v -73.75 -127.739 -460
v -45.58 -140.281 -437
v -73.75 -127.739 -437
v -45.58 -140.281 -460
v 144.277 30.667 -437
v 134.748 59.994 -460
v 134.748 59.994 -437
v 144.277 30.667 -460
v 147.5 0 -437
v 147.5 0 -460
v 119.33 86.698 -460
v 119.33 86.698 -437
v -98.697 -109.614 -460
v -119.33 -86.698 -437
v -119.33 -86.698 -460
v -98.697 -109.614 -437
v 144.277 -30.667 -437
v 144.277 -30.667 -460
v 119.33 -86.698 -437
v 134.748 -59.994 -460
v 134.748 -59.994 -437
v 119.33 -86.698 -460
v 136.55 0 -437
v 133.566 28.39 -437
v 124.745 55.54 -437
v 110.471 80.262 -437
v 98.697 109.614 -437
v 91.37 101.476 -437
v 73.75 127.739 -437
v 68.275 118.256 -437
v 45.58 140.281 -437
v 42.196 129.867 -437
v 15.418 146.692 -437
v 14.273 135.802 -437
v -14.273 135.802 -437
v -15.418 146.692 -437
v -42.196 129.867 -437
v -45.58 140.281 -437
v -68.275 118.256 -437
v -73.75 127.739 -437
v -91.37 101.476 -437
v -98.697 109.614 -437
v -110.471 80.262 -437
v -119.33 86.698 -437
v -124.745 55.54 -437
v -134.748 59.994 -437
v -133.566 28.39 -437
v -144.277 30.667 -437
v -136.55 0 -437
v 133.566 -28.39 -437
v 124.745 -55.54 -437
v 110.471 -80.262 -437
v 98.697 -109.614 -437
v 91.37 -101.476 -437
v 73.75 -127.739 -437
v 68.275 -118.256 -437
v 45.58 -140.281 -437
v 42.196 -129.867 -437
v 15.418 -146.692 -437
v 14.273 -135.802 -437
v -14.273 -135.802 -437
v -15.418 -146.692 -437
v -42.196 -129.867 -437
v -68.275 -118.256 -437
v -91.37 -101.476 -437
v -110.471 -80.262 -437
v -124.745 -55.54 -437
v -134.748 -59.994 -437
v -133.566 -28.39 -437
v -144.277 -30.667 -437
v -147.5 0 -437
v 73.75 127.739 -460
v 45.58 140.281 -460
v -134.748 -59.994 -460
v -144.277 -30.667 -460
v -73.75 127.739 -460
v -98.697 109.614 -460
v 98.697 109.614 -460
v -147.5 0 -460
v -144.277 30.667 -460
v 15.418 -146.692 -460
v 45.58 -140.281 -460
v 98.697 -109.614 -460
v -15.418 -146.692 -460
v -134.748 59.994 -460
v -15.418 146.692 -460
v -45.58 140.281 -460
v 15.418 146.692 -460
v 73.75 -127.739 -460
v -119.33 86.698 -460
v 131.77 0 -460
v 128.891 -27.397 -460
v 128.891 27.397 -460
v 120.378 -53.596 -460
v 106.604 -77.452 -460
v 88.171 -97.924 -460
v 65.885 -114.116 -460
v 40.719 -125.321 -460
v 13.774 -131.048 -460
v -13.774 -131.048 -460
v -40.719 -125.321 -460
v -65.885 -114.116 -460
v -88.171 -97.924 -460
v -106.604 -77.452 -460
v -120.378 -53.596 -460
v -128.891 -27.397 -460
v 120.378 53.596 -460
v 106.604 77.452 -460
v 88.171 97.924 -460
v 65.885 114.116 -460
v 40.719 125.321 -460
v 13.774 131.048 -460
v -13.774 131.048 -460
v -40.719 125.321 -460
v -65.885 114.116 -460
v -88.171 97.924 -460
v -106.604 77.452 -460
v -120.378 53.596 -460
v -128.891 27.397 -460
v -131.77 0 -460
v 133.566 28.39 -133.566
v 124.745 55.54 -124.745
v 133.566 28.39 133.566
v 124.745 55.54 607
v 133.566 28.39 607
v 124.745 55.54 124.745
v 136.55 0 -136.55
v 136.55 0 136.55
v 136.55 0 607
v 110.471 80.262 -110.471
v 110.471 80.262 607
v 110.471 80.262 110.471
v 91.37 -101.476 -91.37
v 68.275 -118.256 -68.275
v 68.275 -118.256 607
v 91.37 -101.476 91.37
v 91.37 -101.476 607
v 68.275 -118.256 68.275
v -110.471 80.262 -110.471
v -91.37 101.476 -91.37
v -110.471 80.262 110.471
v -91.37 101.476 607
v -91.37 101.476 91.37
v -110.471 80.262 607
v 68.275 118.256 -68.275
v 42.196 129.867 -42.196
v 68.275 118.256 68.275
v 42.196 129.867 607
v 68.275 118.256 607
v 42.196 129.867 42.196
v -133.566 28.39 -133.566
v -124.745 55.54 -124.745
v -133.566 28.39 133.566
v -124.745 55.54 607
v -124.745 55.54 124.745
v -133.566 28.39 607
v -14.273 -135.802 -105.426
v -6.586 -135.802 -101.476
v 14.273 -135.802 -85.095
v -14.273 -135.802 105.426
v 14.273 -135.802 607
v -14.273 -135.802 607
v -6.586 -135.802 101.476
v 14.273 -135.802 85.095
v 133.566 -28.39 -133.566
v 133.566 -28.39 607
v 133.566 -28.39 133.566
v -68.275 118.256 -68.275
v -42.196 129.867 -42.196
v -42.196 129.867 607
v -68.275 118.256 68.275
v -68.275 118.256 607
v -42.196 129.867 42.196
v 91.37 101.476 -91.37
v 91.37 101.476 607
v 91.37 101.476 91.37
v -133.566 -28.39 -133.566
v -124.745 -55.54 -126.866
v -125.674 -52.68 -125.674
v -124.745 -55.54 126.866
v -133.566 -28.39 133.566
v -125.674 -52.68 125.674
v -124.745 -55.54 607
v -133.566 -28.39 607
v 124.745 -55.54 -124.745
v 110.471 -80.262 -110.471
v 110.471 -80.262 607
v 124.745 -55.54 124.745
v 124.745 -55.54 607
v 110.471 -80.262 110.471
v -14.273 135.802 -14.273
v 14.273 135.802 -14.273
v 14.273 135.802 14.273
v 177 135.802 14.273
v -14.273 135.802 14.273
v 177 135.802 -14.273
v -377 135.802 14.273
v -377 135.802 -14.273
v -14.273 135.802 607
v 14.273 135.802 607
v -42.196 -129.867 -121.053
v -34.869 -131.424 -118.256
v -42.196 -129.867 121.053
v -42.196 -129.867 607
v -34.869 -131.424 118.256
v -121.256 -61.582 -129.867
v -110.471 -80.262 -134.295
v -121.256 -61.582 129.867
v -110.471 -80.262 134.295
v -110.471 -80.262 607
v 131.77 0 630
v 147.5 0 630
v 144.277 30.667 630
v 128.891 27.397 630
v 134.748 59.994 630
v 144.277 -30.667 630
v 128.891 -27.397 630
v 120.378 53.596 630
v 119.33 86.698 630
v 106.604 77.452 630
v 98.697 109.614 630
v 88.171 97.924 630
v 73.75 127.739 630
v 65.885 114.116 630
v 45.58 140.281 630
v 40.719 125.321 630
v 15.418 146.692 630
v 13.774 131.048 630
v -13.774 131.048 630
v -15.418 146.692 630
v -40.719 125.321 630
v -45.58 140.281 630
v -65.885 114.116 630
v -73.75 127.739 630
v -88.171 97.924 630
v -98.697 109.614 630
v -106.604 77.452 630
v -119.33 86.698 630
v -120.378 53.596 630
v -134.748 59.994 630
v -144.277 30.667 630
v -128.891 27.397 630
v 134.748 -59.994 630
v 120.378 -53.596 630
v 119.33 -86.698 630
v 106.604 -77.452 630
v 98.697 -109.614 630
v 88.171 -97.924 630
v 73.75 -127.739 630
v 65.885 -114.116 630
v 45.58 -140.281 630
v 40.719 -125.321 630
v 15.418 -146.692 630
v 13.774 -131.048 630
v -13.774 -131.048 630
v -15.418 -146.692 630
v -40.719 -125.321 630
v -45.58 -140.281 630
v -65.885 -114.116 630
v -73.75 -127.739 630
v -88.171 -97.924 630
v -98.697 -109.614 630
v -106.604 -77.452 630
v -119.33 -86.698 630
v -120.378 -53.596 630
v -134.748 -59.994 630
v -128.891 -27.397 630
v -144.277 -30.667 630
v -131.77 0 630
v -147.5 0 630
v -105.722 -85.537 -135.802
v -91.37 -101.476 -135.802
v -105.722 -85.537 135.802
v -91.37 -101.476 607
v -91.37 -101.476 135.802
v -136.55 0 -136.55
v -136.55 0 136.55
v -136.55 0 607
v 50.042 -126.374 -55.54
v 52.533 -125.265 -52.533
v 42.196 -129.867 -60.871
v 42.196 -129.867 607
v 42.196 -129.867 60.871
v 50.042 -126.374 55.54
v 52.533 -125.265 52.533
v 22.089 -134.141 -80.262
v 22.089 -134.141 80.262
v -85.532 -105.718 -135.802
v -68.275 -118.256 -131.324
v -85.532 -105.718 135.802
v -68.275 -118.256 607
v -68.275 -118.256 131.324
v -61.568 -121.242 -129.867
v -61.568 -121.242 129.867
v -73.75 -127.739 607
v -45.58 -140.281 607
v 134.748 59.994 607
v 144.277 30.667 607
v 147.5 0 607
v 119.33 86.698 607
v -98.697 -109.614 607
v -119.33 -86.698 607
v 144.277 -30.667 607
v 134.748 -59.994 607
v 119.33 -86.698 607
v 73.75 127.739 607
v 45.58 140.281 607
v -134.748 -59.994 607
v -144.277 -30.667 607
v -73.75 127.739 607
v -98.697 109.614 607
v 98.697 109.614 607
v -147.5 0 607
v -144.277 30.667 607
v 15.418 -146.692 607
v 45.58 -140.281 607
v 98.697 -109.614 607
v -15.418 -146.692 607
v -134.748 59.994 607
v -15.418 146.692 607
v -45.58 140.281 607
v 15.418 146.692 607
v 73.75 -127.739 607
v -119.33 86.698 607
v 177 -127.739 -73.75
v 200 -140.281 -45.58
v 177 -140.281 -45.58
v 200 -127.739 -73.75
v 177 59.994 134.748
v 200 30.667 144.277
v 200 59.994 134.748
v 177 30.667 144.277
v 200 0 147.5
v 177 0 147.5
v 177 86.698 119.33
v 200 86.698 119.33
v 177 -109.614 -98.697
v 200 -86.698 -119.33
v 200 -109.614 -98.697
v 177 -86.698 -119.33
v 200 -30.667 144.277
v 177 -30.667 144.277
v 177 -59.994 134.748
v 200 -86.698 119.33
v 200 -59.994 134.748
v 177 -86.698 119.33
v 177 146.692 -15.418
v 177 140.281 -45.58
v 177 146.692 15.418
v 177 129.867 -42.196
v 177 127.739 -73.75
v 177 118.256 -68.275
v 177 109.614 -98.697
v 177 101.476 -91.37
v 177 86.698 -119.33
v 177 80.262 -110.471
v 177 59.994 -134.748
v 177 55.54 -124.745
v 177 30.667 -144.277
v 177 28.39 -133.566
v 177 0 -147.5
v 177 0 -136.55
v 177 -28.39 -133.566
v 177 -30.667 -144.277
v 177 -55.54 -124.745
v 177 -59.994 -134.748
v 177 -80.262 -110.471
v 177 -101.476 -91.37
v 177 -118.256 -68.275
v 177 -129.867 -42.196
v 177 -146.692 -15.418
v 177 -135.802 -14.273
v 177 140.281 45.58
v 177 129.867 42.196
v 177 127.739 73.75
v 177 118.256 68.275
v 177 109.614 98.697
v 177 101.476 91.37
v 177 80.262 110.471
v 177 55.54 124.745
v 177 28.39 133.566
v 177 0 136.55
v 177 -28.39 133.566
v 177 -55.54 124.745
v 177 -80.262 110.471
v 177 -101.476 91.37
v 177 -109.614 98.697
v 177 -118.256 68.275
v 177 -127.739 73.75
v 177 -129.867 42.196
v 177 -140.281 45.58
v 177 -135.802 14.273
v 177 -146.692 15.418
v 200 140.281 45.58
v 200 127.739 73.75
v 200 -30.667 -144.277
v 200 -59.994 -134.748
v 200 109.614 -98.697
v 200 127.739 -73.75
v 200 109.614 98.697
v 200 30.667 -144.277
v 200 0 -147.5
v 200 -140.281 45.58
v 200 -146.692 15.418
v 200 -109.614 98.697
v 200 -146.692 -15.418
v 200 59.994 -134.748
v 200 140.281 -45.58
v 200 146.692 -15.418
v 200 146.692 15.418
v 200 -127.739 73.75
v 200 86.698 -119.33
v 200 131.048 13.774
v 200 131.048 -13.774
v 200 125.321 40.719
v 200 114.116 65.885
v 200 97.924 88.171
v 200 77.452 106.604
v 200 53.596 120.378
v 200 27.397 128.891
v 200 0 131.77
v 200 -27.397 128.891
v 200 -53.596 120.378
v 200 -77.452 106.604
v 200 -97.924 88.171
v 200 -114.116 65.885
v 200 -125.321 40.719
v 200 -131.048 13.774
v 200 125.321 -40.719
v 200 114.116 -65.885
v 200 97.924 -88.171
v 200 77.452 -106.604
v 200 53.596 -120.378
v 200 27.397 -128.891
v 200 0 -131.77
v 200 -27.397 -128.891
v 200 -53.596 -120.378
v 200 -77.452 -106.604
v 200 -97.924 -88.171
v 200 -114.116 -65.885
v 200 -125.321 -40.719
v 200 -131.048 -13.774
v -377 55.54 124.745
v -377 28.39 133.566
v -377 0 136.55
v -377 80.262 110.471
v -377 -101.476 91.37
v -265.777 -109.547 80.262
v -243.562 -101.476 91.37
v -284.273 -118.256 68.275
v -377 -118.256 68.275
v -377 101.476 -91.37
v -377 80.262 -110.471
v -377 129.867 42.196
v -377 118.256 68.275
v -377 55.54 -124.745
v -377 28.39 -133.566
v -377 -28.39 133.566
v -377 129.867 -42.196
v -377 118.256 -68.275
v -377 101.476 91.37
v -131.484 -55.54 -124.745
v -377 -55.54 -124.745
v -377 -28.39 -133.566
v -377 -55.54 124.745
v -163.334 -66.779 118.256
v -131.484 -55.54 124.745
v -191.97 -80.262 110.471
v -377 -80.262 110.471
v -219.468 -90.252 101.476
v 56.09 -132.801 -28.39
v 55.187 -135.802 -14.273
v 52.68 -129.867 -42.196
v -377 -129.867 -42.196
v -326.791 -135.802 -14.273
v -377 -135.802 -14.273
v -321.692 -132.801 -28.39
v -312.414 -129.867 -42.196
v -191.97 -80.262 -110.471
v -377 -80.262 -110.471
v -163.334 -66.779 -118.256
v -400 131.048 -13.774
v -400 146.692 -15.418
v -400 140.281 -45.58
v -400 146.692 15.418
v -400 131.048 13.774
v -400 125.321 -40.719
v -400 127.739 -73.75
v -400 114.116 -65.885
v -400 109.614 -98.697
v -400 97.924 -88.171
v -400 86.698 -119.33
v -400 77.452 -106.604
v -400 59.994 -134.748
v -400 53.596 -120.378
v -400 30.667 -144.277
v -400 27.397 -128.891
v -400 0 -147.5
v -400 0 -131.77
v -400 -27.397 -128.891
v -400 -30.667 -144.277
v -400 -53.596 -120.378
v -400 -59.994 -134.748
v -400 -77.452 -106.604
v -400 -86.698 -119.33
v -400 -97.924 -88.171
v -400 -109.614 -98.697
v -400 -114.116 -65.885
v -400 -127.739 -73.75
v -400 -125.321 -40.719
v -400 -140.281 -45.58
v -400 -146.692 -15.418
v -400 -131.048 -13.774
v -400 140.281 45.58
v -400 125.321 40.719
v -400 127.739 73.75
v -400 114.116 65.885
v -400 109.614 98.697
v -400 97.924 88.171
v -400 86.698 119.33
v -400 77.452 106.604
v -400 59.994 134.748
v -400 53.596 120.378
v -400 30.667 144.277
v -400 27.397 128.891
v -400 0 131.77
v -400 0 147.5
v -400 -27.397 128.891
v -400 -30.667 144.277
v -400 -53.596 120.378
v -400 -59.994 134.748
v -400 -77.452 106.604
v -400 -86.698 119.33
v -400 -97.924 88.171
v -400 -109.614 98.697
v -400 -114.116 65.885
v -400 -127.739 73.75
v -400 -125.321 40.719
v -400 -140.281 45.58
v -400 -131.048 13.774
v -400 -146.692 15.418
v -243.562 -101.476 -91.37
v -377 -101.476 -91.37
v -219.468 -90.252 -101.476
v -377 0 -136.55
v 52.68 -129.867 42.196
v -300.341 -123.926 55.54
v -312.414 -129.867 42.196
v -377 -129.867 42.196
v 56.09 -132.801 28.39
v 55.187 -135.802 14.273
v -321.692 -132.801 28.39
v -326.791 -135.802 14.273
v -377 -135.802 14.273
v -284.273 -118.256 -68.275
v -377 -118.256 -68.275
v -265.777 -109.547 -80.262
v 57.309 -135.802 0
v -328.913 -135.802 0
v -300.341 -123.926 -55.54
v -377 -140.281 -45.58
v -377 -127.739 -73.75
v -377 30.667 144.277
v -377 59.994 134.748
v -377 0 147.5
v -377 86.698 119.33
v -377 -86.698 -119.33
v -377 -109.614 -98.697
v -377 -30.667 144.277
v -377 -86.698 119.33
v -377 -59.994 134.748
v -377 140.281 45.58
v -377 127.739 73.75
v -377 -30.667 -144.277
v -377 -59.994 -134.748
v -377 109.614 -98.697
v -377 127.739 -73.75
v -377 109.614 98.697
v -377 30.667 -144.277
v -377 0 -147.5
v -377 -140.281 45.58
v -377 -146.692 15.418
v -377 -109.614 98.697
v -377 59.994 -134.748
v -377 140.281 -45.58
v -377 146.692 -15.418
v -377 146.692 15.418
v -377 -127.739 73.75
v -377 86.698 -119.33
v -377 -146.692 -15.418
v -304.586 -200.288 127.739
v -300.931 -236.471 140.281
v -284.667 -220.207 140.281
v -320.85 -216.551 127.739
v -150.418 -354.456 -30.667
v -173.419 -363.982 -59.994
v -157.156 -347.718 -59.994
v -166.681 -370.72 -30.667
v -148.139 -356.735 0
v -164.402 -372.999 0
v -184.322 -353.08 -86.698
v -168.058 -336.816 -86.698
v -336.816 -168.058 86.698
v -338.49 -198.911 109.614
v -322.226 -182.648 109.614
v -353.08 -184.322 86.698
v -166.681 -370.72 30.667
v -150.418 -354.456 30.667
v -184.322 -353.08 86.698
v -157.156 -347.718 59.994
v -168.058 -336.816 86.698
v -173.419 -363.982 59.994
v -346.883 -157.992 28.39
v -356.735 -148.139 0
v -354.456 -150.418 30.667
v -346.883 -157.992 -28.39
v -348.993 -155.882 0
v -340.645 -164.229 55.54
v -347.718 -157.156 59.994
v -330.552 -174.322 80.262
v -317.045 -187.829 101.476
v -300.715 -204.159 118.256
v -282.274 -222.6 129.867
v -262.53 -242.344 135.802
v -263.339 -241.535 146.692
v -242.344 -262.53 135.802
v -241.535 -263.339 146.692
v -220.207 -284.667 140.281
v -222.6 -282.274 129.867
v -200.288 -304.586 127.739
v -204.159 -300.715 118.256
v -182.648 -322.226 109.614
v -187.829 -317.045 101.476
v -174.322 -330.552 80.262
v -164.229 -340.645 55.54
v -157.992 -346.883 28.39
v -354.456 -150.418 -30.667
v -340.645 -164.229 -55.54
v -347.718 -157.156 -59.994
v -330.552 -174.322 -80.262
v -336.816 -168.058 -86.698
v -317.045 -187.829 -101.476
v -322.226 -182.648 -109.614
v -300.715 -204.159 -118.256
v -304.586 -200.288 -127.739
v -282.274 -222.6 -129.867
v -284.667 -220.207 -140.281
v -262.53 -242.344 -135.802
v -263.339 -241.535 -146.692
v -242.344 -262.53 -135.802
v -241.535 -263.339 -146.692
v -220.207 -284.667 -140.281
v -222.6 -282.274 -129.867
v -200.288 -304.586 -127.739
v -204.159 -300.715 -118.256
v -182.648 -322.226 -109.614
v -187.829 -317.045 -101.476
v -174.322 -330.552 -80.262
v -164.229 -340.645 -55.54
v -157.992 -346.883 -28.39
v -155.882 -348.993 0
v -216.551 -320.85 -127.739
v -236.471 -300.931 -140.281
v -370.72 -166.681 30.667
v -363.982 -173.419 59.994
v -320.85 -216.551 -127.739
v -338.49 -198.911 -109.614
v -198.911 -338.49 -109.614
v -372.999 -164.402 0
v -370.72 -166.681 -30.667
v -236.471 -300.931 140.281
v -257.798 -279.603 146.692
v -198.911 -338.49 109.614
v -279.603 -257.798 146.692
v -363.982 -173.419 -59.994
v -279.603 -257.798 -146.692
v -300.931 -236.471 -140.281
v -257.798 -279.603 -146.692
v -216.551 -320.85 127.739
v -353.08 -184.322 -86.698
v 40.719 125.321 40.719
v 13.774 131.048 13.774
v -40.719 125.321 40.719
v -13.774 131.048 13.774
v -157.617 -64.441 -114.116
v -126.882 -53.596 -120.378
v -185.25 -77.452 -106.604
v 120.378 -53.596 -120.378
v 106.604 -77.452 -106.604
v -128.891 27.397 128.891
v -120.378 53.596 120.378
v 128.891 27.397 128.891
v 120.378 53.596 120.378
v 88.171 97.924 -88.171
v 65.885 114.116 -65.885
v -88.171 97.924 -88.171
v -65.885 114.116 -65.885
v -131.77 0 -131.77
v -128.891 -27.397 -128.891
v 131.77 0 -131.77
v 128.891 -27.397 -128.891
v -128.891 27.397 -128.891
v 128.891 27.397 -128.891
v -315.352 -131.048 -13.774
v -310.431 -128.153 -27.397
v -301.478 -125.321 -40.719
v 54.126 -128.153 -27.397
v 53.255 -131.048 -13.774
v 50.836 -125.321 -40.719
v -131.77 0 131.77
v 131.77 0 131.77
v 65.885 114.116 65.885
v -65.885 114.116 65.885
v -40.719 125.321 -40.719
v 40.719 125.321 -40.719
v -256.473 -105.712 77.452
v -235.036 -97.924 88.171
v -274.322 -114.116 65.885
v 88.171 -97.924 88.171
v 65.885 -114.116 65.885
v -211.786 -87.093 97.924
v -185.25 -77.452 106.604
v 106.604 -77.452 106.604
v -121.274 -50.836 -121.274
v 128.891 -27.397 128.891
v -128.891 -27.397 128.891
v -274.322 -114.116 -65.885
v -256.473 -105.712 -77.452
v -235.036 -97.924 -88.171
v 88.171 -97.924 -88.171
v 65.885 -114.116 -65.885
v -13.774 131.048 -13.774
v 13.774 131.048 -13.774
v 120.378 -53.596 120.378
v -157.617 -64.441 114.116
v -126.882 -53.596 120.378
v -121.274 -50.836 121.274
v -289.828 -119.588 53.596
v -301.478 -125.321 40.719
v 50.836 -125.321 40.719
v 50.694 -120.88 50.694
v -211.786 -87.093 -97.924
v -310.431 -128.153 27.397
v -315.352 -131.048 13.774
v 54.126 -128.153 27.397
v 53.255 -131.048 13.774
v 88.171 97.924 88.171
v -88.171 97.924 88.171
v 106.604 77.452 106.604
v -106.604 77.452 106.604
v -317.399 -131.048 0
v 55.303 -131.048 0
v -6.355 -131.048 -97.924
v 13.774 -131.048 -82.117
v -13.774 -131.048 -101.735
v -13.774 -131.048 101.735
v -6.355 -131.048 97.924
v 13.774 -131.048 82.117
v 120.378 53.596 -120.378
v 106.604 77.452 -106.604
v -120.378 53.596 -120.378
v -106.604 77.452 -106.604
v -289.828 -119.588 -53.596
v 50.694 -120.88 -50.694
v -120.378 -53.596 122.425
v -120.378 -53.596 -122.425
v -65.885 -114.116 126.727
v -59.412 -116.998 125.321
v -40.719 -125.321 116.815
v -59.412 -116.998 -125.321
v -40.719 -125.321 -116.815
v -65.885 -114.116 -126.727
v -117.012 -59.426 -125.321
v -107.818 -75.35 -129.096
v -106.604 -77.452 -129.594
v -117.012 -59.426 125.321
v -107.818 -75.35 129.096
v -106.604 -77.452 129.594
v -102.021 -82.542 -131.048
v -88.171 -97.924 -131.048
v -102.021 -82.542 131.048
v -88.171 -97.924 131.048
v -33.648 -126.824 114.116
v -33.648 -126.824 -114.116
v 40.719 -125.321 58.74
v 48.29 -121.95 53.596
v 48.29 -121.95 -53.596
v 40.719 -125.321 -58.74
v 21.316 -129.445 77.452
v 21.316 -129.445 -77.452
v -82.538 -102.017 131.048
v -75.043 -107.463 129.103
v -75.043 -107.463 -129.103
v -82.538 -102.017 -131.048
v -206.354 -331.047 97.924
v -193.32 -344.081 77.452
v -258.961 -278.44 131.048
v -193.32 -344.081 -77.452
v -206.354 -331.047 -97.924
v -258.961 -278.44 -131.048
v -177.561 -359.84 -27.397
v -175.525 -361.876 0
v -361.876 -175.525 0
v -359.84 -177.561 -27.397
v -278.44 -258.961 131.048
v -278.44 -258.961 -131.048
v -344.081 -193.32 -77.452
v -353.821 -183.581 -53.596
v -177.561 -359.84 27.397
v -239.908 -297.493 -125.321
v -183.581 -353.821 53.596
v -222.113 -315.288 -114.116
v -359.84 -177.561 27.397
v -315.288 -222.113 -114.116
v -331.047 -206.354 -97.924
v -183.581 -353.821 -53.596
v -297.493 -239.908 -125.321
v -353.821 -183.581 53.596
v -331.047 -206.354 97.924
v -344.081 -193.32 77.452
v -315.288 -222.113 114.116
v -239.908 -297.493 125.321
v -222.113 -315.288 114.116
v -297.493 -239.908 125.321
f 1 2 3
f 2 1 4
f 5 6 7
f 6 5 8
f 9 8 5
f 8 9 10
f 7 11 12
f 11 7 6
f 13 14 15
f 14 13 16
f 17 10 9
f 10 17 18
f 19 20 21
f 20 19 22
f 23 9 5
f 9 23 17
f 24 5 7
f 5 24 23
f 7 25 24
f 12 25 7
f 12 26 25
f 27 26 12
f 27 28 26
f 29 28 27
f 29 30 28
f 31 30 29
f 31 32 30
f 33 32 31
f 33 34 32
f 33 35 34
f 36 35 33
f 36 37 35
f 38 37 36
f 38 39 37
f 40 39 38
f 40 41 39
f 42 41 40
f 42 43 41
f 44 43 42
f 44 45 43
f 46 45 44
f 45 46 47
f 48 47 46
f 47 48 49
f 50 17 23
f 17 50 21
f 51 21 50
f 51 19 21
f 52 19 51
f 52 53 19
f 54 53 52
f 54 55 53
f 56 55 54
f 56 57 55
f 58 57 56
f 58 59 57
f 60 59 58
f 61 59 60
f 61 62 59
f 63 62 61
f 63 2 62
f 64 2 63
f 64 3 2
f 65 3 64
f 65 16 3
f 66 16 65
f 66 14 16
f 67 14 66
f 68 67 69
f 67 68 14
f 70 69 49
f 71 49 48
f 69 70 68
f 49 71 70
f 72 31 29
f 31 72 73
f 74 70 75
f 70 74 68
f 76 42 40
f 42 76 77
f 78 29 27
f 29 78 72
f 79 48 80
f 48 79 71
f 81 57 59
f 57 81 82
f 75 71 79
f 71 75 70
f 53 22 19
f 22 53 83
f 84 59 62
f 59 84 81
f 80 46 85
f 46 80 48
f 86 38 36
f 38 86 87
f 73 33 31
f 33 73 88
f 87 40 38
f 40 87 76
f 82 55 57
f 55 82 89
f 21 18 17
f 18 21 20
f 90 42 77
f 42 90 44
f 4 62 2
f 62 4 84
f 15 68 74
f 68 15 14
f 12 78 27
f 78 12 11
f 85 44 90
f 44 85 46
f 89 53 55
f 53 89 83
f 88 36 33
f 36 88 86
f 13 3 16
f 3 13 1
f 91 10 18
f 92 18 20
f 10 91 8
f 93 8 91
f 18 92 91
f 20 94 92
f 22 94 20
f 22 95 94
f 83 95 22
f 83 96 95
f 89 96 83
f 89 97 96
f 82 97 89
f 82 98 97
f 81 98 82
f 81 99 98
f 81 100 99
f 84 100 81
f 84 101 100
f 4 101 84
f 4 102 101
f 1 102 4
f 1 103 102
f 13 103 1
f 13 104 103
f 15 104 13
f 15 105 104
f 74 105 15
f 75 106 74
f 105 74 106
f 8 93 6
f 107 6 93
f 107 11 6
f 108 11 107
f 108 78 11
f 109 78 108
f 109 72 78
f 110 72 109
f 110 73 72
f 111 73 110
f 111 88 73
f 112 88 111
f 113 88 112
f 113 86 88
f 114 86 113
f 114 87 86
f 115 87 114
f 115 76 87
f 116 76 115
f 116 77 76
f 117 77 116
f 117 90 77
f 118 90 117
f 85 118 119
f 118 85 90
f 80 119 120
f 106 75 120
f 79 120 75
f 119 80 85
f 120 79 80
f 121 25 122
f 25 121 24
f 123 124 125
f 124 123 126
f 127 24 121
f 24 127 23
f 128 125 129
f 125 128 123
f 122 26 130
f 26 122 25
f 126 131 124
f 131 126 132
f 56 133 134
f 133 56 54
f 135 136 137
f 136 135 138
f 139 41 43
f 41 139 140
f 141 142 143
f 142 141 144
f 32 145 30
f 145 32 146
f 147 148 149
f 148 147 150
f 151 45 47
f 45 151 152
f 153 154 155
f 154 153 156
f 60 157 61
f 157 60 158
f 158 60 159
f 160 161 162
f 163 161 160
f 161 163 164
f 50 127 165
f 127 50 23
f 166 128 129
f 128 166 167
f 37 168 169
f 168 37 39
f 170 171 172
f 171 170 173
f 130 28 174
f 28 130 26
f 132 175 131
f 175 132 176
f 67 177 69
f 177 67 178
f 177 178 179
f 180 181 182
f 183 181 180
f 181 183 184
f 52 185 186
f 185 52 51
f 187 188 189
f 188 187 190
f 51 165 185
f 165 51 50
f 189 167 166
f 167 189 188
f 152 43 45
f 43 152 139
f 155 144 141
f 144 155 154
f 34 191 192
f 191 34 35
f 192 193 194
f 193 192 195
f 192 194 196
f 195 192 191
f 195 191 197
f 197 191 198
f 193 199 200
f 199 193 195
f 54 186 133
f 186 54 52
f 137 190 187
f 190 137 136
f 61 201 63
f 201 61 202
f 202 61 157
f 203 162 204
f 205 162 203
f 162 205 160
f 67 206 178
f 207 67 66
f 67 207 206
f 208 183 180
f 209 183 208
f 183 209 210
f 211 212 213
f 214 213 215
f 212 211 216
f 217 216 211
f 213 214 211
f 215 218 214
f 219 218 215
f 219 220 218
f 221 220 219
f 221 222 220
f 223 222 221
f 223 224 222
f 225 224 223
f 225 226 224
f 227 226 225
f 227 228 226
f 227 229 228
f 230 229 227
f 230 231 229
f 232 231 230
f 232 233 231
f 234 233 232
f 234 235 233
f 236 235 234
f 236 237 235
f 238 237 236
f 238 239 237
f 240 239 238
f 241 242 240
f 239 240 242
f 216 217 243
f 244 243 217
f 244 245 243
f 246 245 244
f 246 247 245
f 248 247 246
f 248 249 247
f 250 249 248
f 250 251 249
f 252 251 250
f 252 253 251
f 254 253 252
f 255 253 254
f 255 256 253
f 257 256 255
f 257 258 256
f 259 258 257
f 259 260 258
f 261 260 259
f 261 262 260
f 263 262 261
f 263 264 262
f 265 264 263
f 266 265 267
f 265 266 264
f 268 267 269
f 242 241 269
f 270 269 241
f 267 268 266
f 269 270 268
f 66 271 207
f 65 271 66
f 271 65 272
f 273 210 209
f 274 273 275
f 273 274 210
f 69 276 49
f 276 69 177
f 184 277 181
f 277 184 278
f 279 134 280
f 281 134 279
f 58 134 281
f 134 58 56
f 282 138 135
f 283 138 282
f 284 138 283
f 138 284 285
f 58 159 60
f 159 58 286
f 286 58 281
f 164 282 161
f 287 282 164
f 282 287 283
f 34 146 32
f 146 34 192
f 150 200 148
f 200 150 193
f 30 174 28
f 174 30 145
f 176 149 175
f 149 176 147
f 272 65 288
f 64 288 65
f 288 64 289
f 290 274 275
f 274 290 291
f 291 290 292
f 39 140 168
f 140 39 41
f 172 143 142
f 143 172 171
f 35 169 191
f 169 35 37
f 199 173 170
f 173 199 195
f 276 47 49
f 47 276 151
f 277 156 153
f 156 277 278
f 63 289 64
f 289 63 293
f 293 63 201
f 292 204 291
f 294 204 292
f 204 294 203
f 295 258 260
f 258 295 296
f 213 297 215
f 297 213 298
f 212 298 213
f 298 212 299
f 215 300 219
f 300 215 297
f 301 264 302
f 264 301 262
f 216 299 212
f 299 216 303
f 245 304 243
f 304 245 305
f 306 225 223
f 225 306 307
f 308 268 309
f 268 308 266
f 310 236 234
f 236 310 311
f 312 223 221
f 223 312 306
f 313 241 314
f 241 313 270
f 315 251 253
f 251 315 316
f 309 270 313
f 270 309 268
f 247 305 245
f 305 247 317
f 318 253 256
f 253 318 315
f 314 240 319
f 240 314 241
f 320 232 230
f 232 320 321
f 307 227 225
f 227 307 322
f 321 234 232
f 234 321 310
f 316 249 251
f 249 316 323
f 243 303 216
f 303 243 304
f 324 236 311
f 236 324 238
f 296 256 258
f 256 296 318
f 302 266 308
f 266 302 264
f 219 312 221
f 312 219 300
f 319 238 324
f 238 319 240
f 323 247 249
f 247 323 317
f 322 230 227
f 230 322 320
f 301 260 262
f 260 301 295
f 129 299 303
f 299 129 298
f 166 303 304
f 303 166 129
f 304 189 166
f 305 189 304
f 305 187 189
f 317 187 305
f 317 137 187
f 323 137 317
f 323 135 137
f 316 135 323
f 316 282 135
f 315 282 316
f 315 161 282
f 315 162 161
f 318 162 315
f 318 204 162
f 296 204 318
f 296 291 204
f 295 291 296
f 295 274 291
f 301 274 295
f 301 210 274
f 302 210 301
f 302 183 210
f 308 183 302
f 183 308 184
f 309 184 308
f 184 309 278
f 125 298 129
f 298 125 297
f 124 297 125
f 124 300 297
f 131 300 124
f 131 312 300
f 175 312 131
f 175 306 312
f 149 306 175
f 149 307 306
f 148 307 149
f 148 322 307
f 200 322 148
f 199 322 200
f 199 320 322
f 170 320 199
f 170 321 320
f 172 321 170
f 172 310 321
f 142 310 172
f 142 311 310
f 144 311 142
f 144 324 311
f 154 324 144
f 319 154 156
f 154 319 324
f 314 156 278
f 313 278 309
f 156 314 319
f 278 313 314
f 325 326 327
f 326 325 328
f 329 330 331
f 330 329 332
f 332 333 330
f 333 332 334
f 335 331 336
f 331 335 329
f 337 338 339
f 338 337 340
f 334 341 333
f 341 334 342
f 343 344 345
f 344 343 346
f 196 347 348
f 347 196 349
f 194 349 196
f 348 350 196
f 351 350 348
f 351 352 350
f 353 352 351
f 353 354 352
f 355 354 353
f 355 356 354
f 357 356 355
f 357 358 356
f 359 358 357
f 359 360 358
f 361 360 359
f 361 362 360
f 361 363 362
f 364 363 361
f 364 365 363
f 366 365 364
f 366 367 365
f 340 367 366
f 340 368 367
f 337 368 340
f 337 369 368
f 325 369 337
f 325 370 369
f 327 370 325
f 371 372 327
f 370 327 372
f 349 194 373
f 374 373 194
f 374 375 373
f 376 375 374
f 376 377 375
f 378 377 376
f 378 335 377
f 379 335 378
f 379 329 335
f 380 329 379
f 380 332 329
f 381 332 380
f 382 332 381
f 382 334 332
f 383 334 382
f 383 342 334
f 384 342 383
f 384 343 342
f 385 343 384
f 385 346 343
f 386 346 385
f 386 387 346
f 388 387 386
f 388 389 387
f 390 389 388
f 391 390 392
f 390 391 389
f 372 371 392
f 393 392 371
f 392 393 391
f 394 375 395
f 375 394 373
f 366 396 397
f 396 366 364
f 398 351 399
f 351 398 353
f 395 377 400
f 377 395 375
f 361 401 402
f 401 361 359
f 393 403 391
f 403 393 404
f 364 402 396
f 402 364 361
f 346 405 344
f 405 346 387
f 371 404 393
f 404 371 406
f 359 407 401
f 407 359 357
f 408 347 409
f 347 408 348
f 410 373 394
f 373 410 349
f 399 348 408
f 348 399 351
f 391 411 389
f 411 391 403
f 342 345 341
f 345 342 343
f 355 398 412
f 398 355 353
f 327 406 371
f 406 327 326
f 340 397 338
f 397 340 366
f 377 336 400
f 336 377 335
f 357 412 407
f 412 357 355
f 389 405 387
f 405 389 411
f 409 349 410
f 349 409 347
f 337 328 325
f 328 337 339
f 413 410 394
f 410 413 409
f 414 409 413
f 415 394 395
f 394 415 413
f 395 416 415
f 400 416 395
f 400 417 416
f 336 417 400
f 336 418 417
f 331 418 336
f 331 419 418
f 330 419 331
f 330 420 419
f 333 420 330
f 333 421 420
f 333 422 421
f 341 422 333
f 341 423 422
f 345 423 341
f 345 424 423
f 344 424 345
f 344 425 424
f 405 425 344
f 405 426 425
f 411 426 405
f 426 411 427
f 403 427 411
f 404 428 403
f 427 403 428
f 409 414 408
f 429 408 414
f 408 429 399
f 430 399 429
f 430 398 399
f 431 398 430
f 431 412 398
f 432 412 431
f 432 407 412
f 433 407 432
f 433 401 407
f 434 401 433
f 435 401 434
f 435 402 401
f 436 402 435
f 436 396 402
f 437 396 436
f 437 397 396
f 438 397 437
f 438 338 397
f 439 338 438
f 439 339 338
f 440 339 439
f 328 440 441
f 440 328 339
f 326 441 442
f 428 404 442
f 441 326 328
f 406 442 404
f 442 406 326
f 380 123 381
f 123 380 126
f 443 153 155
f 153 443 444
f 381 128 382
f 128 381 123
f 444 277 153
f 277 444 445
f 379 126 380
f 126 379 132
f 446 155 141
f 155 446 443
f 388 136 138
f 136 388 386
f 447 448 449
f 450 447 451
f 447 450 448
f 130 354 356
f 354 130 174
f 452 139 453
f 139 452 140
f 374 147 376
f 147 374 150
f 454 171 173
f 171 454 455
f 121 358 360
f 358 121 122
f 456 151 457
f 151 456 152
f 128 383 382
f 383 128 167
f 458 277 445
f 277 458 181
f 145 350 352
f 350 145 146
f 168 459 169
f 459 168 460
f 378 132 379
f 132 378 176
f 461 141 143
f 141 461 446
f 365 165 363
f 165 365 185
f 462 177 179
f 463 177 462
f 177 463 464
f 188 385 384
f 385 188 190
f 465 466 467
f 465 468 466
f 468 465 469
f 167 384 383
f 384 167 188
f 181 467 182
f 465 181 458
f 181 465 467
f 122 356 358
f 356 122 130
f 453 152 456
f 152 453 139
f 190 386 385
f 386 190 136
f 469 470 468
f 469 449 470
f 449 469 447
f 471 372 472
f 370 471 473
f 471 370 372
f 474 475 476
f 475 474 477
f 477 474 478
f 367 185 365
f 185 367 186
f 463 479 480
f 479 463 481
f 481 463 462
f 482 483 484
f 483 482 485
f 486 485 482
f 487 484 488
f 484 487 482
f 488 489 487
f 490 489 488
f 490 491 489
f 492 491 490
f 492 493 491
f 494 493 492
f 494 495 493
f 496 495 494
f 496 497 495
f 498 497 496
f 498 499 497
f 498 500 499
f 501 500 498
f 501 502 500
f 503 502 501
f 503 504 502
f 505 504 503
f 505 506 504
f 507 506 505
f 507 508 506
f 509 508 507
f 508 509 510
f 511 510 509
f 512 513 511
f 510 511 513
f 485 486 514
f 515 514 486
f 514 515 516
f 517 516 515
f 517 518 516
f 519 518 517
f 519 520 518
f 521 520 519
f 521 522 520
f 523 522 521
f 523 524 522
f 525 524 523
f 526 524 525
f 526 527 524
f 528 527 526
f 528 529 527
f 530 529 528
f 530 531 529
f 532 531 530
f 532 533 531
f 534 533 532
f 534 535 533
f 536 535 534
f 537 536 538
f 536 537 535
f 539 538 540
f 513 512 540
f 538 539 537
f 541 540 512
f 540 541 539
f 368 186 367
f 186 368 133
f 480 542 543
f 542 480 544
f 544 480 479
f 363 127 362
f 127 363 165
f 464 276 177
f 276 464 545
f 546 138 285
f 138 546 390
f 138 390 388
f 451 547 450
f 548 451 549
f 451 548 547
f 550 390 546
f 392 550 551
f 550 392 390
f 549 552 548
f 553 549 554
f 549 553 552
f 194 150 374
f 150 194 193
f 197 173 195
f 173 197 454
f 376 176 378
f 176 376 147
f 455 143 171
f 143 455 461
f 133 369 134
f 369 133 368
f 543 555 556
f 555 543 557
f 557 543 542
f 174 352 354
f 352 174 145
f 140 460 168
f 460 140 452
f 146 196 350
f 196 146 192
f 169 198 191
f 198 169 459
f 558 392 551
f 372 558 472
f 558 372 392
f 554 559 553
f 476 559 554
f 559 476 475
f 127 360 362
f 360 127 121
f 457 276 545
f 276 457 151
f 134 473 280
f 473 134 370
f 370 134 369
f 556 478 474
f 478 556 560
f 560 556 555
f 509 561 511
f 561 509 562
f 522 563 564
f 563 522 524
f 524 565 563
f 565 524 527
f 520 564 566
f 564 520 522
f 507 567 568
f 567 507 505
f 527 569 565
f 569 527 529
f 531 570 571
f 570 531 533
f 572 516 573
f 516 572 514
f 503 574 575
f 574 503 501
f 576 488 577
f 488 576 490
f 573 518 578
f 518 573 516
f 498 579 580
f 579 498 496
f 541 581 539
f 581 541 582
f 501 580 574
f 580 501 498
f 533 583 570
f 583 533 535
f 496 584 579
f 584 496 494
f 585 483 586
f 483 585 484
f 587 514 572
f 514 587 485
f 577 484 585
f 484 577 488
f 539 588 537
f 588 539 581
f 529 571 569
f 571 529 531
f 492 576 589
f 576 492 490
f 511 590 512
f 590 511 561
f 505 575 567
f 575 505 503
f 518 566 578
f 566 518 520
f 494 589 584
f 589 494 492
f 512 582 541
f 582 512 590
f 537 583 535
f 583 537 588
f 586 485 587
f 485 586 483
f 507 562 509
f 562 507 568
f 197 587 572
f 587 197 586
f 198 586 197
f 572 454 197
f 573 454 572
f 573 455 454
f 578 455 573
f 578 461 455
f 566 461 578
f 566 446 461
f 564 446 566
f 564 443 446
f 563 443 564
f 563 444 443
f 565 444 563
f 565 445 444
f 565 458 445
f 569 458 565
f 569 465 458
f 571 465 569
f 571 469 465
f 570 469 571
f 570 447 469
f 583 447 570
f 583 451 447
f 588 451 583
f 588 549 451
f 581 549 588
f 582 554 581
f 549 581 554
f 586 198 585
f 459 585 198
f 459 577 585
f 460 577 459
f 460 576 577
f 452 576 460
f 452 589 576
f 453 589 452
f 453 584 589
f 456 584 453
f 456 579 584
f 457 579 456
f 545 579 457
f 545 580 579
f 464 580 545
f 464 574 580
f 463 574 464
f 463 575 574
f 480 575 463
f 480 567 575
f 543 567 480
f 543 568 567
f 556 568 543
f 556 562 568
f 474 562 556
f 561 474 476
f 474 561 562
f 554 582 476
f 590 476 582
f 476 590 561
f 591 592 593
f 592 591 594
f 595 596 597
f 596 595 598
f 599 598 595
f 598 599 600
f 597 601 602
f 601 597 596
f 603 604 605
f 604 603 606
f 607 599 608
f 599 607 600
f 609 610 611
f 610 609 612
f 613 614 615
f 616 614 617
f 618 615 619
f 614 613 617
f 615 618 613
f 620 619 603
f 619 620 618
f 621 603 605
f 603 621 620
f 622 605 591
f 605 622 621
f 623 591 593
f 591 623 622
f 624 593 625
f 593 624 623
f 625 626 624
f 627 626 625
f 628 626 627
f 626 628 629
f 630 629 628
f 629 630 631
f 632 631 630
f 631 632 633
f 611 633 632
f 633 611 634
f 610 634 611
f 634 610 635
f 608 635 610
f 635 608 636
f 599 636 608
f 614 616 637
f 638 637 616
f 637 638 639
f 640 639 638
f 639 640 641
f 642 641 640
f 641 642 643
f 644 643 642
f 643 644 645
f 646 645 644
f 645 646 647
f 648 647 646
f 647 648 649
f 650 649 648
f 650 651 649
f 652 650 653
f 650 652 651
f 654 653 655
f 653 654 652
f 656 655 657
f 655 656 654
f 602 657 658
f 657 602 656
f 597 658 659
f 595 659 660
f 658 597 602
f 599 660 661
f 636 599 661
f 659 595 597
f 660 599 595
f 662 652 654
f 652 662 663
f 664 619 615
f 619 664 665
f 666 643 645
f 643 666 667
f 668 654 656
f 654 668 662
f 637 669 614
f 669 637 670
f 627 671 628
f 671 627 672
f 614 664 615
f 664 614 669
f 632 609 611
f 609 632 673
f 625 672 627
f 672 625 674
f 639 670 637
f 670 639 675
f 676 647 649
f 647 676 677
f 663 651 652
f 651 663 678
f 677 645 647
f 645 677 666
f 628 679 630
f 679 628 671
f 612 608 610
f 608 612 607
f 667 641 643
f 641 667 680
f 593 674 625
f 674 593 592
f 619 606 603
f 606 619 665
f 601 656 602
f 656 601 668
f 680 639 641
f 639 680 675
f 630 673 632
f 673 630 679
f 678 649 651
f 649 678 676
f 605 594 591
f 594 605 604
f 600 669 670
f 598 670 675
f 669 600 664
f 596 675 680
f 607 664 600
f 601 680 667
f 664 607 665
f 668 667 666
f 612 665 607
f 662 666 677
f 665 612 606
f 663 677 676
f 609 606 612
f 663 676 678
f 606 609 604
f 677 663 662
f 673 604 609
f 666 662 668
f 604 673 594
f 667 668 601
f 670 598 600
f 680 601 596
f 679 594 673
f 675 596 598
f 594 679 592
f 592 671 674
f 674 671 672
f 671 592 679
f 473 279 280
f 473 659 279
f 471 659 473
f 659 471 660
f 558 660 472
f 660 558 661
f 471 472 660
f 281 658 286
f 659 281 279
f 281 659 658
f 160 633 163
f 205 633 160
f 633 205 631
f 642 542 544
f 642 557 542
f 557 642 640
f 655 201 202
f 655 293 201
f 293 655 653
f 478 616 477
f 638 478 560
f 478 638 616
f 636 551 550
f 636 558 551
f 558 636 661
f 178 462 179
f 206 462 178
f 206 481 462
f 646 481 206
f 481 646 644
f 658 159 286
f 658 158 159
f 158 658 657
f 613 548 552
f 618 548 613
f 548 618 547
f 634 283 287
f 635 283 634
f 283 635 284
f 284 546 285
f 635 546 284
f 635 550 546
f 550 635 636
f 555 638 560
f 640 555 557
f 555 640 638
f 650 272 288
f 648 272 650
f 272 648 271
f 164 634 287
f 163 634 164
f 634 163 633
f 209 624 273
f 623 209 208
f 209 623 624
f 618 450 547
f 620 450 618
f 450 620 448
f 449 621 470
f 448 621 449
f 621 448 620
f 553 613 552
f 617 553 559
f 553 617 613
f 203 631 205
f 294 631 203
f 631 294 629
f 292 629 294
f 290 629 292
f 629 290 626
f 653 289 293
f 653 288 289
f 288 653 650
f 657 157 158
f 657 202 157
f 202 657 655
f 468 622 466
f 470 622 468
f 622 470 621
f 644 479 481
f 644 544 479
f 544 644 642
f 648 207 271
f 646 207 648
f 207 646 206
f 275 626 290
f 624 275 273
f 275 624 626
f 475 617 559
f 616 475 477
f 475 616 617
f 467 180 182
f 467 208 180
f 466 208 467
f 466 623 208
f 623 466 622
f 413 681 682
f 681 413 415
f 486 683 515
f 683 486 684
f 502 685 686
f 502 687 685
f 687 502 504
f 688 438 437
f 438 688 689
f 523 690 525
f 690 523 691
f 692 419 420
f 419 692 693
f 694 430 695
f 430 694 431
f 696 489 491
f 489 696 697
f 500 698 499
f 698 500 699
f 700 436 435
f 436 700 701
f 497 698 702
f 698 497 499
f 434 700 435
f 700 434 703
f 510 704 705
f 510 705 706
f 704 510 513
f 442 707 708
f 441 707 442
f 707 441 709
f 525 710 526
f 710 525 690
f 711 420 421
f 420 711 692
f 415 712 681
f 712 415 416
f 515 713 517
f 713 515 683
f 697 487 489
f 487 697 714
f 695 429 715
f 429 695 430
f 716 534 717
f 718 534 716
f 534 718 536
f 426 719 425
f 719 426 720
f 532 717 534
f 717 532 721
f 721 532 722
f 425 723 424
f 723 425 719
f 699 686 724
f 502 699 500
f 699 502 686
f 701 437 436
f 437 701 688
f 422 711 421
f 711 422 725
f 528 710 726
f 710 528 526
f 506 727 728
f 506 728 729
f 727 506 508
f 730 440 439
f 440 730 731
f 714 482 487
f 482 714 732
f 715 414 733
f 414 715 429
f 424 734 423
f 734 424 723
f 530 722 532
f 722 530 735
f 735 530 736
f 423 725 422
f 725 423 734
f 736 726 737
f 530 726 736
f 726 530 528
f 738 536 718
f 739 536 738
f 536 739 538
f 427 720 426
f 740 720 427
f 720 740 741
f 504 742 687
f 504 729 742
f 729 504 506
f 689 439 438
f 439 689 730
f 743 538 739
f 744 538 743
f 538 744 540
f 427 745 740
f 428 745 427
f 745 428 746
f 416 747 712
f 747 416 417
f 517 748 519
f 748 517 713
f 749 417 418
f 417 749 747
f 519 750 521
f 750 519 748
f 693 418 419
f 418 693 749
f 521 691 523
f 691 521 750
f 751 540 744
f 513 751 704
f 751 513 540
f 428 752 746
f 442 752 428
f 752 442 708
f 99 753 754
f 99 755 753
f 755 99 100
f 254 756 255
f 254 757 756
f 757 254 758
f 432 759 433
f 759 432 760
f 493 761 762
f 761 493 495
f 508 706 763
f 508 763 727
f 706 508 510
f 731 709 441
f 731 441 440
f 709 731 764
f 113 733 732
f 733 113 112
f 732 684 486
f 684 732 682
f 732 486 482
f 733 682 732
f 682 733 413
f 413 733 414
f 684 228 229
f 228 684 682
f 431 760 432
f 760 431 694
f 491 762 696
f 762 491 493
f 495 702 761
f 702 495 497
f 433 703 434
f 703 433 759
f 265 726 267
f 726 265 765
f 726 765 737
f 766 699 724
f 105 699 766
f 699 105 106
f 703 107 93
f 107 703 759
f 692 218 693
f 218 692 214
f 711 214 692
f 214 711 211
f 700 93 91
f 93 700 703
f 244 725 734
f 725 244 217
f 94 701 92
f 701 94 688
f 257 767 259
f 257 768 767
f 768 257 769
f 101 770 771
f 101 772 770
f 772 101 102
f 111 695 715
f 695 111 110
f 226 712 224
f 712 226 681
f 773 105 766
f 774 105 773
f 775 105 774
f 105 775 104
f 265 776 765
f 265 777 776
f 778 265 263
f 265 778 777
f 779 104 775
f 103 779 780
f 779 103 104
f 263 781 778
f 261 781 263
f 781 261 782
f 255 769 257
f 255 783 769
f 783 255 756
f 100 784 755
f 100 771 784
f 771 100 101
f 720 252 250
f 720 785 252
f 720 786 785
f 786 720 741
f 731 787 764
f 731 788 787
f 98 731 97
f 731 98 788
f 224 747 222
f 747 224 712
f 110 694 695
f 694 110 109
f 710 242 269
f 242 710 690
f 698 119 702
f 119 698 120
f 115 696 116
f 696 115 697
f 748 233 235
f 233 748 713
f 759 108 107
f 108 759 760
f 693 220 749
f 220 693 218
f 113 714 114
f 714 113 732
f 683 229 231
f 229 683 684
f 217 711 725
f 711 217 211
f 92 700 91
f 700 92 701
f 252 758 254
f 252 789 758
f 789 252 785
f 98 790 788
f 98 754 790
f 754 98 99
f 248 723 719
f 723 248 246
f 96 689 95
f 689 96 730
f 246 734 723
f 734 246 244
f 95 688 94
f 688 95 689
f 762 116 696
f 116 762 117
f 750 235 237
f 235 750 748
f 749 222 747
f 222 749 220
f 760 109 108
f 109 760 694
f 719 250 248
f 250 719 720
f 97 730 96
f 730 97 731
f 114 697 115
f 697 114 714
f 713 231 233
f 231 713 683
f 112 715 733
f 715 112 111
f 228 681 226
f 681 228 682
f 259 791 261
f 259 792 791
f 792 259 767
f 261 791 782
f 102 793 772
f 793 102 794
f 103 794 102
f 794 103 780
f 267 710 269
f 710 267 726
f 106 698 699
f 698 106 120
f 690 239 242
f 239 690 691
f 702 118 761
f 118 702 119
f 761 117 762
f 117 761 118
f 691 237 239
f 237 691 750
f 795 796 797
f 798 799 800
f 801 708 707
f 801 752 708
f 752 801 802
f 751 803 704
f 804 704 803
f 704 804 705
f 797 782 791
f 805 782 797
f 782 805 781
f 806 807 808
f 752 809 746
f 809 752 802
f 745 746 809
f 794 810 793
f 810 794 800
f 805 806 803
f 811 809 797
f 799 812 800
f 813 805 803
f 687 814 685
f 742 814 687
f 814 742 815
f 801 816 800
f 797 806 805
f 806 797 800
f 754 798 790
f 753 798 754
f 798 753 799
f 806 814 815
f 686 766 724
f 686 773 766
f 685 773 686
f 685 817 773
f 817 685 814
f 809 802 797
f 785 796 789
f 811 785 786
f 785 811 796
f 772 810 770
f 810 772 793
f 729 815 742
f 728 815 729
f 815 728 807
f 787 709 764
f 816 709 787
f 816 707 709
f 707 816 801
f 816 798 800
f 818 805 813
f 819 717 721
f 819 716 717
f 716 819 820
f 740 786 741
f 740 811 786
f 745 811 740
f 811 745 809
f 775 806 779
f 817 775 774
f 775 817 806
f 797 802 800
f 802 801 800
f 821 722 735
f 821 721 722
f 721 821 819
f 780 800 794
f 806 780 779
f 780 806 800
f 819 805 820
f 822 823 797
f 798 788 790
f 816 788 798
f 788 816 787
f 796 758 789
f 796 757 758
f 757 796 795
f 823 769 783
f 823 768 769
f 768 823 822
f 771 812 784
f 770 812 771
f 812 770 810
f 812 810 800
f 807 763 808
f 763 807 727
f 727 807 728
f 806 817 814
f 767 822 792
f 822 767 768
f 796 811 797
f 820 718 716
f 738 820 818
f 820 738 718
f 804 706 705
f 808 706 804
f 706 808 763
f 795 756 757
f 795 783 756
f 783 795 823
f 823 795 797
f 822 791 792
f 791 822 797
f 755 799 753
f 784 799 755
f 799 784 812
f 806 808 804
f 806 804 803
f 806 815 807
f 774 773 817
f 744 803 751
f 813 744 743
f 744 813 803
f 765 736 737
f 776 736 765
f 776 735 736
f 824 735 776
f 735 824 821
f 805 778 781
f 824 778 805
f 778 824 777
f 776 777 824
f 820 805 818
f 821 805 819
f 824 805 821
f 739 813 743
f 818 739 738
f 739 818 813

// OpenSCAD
flangeD=295;
flangeT=23;

pipeOuterD=273.1;
pipeWallT=4.78;

// downstream chamber
drawChamber();

//translate ([-600,0,0]) translate ([400,0,0]) drawChamber(); 

//translate ([-1500,0,0]) drawChamber(); 

//translate ([-600,0,0]) drawChamber(); 

// upstream chamber
//translate ([-400,0,0]) drawChamber(upstreamPipeL=200, downstreamPipeL=400, viewPortZAngle=-45); // downstream chamber

module drawChamber ( botPipeL=460, topPipeL=630, upstreamPipeL=400, downstreamPipeL=200, viewPipeL=380, viewPortZAngle=-135 ) {
    difference(){
        union(){
            //vert Pipe
            translate([0,0,-botPipeL]) union(){
                cylinder(h=flangeT, d=flangeD); //bot flange
                cylinder(h=botPipeL+topPipeL, d=pipeOuterD); //vert pipe
                translate([0,0,botPipeL+topPipeL-flangeT]) cylinder(h=flangeT, d=flangeD); //top flange
            }
            //horz pipe
            rotate([0,-90,0]) translate([0,0,-downstreamPipeL]) union(){
                cylinder(h=flangeT, d=flangeD); //downstream flange
                cylinder(h=downstreamPipeL+upstreamPipeL, d=pipeOuterD); //horz pipe
                translate([0,0,downstreamPipeL+upstreamPipeL-flangeT]) cylinder(h=flangeT, d=flangeD); //upstream flange
            }
            //view pipe
            rotate([-90,0,viewPortZAngle+90]) translate([0,0,-viewPipeL]) union(){
                cylinder(h=flangeT, d=flangeD); //view flange
                cylinder(h=viewPipeL, d=pipeOuterD); //vert pipe
            }
        }
        rotate([0,-90,0]) translate([0,0,-downstreamPipeL]) cylinder(h=downstreamPipeL+upstreamPipeL, d=pipeOuterD-2*pipeWallT); // inner horz pipe
        translate([0,0,-botPipeL]) cylinder(h=botPipeL+topPipeL, d=pipeOuterD-2*pipeWallT); //inner vert pipe
        rotate([-90,0,viewPortZAngle+90]) translate([0,0,-viewPipeL]) cylinder(h=viewPipeL, d=pipeOuterD-2*pipeWallT); //inner view pipe
    }
}
